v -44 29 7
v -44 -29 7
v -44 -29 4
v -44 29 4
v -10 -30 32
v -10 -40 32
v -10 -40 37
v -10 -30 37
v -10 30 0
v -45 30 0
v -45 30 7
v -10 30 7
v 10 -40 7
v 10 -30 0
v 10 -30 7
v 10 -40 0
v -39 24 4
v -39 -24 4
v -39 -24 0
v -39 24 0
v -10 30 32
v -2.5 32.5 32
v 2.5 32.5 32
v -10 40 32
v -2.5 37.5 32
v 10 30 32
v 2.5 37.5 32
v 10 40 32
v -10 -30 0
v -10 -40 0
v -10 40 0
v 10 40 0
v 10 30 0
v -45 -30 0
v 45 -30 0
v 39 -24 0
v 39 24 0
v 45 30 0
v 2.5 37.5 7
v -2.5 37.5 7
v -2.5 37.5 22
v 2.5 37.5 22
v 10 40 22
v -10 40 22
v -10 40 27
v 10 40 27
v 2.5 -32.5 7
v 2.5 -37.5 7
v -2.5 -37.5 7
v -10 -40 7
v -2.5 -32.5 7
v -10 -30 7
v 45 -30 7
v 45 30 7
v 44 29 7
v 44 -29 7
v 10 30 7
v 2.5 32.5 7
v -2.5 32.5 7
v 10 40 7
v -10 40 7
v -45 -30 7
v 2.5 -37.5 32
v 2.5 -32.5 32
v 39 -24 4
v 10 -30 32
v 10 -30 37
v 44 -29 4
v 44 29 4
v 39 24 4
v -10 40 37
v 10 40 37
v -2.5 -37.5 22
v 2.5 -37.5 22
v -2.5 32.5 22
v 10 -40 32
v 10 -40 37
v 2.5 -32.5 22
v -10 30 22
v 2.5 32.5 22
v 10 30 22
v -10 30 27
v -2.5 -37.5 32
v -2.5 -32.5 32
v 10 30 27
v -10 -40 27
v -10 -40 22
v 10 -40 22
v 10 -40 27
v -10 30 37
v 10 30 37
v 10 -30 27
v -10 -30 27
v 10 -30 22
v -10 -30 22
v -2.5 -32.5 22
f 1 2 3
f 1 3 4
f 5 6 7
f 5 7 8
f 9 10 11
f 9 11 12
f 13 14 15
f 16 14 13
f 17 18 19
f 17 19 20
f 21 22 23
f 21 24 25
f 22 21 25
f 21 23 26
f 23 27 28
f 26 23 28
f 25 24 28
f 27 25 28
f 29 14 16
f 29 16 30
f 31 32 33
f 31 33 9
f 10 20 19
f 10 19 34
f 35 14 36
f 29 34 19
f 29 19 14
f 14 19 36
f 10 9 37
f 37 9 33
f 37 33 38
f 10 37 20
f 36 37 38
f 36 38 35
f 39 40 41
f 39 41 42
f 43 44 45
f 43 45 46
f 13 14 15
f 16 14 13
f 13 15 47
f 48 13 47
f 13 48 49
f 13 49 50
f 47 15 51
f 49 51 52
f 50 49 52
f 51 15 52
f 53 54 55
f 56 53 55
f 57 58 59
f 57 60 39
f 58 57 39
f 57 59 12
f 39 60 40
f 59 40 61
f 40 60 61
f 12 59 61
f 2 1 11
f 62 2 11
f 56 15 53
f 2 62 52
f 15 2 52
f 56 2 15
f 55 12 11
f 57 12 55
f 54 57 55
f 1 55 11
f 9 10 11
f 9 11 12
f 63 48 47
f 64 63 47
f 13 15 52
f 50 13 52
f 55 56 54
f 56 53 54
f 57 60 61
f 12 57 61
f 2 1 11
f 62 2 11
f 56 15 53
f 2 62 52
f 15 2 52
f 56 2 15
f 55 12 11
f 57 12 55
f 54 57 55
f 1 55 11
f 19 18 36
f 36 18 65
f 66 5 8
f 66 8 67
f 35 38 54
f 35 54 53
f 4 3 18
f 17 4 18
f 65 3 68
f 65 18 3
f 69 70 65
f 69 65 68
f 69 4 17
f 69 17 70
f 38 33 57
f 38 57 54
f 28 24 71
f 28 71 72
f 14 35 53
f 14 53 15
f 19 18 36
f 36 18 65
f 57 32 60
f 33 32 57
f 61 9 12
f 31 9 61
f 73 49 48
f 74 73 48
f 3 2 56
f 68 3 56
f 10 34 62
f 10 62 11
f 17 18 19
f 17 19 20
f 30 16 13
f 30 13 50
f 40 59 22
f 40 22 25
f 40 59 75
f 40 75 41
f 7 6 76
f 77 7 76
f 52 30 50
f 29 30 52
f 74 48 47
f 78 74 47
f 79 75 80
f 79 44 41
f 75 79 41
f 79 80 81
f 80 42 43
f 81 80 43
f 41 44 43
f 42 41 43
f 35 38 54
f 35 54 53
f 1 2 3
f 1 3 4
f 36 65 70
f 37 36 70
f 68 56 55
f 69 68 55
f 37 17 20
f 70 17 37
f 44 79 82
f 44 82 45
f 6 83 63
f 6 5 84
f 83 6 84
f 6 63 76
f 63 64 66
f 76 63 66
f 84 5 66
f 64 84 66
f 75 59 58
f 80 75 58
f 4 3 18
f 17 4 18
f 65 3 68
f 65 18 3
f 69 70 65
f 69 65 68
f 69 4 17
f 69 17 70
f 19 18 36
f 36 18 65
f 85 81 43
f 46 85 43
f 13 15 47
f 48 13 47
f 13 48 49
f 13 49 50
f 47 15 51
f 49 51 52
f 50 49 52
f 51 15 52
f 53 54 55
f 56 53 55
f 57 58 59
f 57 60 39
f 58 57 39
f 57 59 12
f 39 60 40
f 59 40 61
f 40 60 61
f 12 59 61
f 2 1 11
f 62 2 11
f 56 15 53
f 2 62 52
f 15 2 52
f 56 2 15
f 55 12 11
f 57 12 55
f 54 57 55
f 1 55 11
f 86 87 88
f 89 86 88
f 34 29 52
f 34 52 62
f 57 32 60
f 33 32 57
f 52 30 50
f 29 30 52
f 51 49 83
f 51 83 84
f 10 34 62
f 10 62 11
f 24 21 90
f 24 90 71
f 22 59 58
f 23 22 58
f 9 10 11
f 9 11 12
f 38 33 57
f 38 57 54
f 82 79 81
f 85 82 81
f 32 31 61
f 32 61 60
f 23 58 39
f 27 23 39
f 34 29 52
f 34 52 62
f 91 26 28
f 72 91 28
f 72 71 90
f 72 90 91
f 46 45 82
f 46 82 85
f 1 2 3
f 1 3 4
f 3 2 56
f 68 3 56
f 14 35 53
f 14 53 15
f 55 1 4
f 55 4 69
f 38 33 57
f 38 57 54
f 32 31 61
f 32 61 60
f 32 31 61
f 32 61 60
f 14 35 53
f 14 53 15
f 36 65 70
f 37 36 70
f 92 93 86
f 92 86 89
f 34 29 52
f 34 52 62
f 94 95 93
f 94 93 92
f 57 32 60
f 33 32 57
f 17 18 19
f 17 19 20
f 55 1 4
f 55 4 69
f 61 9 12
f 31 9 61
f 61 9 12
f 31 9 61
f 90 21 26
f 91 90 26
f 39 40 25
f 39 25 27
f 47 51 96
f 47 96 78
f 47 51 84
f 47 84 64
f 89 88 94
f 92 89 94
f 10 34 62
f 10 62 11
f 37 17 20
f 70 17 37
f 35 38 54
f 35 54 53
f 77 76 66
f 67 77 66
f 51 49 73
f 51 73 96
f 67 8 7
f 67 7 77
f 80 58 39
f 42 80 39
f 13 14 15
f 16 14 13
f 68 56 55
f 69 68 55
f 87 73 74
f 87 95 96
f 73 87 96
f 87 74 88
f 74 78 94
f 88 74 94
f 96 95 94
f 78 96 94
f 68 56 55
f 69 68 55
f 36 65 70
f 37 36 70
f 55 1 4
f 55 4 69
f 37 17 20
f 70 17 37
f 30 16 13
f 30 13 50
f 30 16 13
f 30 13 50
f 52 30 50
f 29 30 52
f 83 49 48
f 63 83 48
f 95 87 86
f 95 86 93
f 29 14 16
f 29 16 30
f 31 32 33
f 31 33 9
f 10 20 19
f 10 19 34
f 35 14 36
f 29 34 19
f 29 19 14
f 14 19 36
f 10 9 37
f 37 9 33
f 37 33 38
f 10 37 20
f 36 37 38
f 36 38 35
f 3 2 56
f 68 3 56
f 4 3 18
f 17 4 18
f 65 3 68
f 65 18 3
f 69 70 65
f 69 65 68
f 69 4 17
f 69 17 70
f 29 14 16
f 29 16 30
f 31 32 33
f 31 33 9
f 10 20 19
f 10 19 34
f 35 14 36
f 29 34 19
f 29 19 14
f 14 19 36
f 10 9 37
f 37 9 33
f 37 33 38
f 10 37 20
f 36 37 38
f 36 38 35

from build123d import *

# Parameters (mm, degrees)
PAD_DEPTH       = 7
SKETCH005_W     = 88
SKETCH005_H     = 58
POCKET_DEPTH    = 3
SKETCH_W        = 78
SKETCH_H        = 48
POCKET001_DEPTH = 5
SKETCH006_W     = 5
SKETCH006_H     = 5
PAD001_DEPTH    = 25
SKETCH007_W     = 5
SKETCH007_H     = 5
PAD002_DEPTH    = 25
SKETCH008_W     = 20
SKETCH008_H     = 10
PAD003_DEPTH    = 5
SKETCH009_W     = 20
SKETCH009_H     = 10
PAD004_DEPTH    = 5
PAD006_DEPTH    = 7
SKETCH010_W     = 88
SKETCH010_H     = 58
POCKET003_DEPTH = 3
SKETCH011_W     = 78
SKETCH011_H     = 48
POCKET002_DEPTH = 5
SKETCH016_W     = 5
SKETCH016_H     = 5
PAD007_DEPTH    = 15
SKETCH014_W     = 5
SKETCH014_H     = 5
PAD005_DEPTH    = 15
SKETCH015_W     = 20
SKETCH015_H     = 10
PAD008_DEPTH    = 5
SKETCH013_W     = 20
SKETCH013_H     = 10
PAD009_DEPTH    = 5
PAD011_DEPTH    = 7
SKETCH017_W     = 88
SKETCH017_H     = 58
POCKET005_DEPTH = 3
SKETCH018_W     = 78
SKETCH018_H     = 48
POCKET004_DEPTH = 5


with BuildPart() as mitte:
    # Sketch004 → Pad (new body)
    with BuildSketch(Plane.XY):
        Polygon((45, 30), (45, -30), (10, -30), (10, -40), (-10, -40), (-10, -30), (-45, -30), (-45, 30), (-10, 30), (-10, 40), (10, 40), (10, 30), align=None)
    extrude(amount=PAD_DEPTH)

    # Sketch005 (on Face14 of Pad) → Pocket (cut)
    with BuildSketch(Plane.XY.offset(7)):
        Rectangle(SKETCH005_W, SKETCH005_H)
    extrude(amount=-POCKET_DEPTH, mode=Mode.SUBTRACT)

    # Sketch (on Face19 of Pocket) → Pocket001 (cut)
    with BuildSketch(Plane.XY.offset(4)):
        Rectangle(SKETCH_W, SKETCH_H)
    extrude(amount=-POCKET001_DEPTH, mode=Mode.SUBTRACT)

    # Sketch006 (on Face5 of Pocket001) → Pad001 (join)
    with BuildSketch(Plane.XY.offset(7)):
        with Locations((0, 35)):
            Rectangle(SKETCH006_W, SKETCH006_H)
    extrude(amount=PAD001_DEPTH)

    # Sketch007 (on Face5 of Pocket001) → Pad002 (join)
    with BuildSketch(Plane.XY.offset(7)):
        with Locations((0, -35)):
            Rectangle(SKETCH007_W, SKETCH007_H)
    extrude(amount=PAD002_DEPTH)

    # Sketch008 (on Face33 of Pad002) → Pad003 (join)
    with BuildSketch(Plane.XY.offset(32)):
        with Locations((0, -35)):
            Rectangle(SKETCH008_W, SKETCH008_H)
    extrude(amount=PAD003_DEPTH)

    # Sketch009 (on Face33 of Pad002) → Pad004 (join)
    with BuildSketch(Plane.XY.offset(32)):
        with Locations((0, 35)):
            Rectangle(SKETCH009_W, SKETCH009_H)
    extrude(amount=PAD004_DEPTH)


with BuildPart() as unten:
    # Sketch012 → Pad006 (new body)
    with BuildSketch(Plane.XY):
        Polygon((45, 30), (45, -30), (10, -30), (10, -40), (-10, -40), (-10, -30), (-45, -30), (-45, 30), (-10, 30), (-10, 40), (10, 40), (10, 30), align=None)
    extrude(amount=PAD006_DEPTH)

    # Sketch010 (on Face14 of Pad006) → Pocket003 (cut)
    with BuildSketch(Plane.XY.offset(7)):
        Rectangle(SKETCH010_W, SKETCH010_H)
    extrude(amount=-POCKET003_DEPTH, mode=Mode.SUBTRACT)

    # Sketch011 (on Face19 of Pocket003) → Pocket002 (cut)
    with BuildSketch(Plane.XY.offset(4)):
        Rectangle(SKETCH011_W, SKETCH011_H)
    extrude(amount=-POCKET002_DEPTH, mode=Mode.SUBTRACT)

    # Sketch016 (on Face5 of Pocket002) → Pad007 (join)
    with BuildSketch(Plane.XY.offset(7)):
        with Locations((0, 35)):
            Rectangle(SKETCH016_W, SKETCH016_H)
    extrude(amount=PAD007_DEPTH)

    # Sketch014 (on Face5 of Pocket002) → Pad005 (join)
    with BuildSketch(Plane.XY.offset(7)):
        with Locations((0, -35)):
            Rectangle(SKETCH014_W, SKETCH014_H)
    extrude(amount=PAD005_DEPTH)

    # Sketch015 (on Face33 of Pad005) → Pad008 (join)
    with BuildSketch(Plane.XY.offset(22)):
        with Locations((0, -35)):
            Rectangle(SKETCH015_W, SKETCH015_H)
    extrude(amount=PAD008_DEPTH)

    # Sketch013 (on Face33 of Pad005) → Pad009 (join)
    with BuildSketch(Plane.XY.offset(22)):
        with Locations((0, 35)):
            Rectangle(SKETCH013_W, SKETCH013_H)
    extrude(amount=PAD009_DEPTH)


with BuildPart() as oben:
    # Sketch019 → Pad011 (new body)
    with BuildSketch(Plane.XY):
        Polygon((45, 30), (45, -30), (10, -30), (10, -40), (-10, -40), (-10, -30), (-45, -30), (-45, 30), (-10, 30), (-10, 40), (10, 40), (10, 30), align=None)
    extrude(amount=PAD011_DEPTH)

    # Sketch017 (on Face14 of Pad011) → Pocket005 (cut)
    with BuildSketch(Plane.XY.offset(7)):
        Rectangle(SKETCH017_W, SKETCH017_H)
    extrude(amount=-POCKET005_DEPTH, mode=Mode.SUBTRACT)

    # Sketch018 (on Face19 of Pocket005) → Pocket004 (cut)
    with BuildSketch(Plane.XY.offset(4)):
        Rectangle(SKETCH018_W, SKETCH018_H)
    extrude(amount=-POCKET004_DEPTH, mode=Mode.SUBTRACT)


solid = Compound([mitte.part, unten.part, oben.part])
